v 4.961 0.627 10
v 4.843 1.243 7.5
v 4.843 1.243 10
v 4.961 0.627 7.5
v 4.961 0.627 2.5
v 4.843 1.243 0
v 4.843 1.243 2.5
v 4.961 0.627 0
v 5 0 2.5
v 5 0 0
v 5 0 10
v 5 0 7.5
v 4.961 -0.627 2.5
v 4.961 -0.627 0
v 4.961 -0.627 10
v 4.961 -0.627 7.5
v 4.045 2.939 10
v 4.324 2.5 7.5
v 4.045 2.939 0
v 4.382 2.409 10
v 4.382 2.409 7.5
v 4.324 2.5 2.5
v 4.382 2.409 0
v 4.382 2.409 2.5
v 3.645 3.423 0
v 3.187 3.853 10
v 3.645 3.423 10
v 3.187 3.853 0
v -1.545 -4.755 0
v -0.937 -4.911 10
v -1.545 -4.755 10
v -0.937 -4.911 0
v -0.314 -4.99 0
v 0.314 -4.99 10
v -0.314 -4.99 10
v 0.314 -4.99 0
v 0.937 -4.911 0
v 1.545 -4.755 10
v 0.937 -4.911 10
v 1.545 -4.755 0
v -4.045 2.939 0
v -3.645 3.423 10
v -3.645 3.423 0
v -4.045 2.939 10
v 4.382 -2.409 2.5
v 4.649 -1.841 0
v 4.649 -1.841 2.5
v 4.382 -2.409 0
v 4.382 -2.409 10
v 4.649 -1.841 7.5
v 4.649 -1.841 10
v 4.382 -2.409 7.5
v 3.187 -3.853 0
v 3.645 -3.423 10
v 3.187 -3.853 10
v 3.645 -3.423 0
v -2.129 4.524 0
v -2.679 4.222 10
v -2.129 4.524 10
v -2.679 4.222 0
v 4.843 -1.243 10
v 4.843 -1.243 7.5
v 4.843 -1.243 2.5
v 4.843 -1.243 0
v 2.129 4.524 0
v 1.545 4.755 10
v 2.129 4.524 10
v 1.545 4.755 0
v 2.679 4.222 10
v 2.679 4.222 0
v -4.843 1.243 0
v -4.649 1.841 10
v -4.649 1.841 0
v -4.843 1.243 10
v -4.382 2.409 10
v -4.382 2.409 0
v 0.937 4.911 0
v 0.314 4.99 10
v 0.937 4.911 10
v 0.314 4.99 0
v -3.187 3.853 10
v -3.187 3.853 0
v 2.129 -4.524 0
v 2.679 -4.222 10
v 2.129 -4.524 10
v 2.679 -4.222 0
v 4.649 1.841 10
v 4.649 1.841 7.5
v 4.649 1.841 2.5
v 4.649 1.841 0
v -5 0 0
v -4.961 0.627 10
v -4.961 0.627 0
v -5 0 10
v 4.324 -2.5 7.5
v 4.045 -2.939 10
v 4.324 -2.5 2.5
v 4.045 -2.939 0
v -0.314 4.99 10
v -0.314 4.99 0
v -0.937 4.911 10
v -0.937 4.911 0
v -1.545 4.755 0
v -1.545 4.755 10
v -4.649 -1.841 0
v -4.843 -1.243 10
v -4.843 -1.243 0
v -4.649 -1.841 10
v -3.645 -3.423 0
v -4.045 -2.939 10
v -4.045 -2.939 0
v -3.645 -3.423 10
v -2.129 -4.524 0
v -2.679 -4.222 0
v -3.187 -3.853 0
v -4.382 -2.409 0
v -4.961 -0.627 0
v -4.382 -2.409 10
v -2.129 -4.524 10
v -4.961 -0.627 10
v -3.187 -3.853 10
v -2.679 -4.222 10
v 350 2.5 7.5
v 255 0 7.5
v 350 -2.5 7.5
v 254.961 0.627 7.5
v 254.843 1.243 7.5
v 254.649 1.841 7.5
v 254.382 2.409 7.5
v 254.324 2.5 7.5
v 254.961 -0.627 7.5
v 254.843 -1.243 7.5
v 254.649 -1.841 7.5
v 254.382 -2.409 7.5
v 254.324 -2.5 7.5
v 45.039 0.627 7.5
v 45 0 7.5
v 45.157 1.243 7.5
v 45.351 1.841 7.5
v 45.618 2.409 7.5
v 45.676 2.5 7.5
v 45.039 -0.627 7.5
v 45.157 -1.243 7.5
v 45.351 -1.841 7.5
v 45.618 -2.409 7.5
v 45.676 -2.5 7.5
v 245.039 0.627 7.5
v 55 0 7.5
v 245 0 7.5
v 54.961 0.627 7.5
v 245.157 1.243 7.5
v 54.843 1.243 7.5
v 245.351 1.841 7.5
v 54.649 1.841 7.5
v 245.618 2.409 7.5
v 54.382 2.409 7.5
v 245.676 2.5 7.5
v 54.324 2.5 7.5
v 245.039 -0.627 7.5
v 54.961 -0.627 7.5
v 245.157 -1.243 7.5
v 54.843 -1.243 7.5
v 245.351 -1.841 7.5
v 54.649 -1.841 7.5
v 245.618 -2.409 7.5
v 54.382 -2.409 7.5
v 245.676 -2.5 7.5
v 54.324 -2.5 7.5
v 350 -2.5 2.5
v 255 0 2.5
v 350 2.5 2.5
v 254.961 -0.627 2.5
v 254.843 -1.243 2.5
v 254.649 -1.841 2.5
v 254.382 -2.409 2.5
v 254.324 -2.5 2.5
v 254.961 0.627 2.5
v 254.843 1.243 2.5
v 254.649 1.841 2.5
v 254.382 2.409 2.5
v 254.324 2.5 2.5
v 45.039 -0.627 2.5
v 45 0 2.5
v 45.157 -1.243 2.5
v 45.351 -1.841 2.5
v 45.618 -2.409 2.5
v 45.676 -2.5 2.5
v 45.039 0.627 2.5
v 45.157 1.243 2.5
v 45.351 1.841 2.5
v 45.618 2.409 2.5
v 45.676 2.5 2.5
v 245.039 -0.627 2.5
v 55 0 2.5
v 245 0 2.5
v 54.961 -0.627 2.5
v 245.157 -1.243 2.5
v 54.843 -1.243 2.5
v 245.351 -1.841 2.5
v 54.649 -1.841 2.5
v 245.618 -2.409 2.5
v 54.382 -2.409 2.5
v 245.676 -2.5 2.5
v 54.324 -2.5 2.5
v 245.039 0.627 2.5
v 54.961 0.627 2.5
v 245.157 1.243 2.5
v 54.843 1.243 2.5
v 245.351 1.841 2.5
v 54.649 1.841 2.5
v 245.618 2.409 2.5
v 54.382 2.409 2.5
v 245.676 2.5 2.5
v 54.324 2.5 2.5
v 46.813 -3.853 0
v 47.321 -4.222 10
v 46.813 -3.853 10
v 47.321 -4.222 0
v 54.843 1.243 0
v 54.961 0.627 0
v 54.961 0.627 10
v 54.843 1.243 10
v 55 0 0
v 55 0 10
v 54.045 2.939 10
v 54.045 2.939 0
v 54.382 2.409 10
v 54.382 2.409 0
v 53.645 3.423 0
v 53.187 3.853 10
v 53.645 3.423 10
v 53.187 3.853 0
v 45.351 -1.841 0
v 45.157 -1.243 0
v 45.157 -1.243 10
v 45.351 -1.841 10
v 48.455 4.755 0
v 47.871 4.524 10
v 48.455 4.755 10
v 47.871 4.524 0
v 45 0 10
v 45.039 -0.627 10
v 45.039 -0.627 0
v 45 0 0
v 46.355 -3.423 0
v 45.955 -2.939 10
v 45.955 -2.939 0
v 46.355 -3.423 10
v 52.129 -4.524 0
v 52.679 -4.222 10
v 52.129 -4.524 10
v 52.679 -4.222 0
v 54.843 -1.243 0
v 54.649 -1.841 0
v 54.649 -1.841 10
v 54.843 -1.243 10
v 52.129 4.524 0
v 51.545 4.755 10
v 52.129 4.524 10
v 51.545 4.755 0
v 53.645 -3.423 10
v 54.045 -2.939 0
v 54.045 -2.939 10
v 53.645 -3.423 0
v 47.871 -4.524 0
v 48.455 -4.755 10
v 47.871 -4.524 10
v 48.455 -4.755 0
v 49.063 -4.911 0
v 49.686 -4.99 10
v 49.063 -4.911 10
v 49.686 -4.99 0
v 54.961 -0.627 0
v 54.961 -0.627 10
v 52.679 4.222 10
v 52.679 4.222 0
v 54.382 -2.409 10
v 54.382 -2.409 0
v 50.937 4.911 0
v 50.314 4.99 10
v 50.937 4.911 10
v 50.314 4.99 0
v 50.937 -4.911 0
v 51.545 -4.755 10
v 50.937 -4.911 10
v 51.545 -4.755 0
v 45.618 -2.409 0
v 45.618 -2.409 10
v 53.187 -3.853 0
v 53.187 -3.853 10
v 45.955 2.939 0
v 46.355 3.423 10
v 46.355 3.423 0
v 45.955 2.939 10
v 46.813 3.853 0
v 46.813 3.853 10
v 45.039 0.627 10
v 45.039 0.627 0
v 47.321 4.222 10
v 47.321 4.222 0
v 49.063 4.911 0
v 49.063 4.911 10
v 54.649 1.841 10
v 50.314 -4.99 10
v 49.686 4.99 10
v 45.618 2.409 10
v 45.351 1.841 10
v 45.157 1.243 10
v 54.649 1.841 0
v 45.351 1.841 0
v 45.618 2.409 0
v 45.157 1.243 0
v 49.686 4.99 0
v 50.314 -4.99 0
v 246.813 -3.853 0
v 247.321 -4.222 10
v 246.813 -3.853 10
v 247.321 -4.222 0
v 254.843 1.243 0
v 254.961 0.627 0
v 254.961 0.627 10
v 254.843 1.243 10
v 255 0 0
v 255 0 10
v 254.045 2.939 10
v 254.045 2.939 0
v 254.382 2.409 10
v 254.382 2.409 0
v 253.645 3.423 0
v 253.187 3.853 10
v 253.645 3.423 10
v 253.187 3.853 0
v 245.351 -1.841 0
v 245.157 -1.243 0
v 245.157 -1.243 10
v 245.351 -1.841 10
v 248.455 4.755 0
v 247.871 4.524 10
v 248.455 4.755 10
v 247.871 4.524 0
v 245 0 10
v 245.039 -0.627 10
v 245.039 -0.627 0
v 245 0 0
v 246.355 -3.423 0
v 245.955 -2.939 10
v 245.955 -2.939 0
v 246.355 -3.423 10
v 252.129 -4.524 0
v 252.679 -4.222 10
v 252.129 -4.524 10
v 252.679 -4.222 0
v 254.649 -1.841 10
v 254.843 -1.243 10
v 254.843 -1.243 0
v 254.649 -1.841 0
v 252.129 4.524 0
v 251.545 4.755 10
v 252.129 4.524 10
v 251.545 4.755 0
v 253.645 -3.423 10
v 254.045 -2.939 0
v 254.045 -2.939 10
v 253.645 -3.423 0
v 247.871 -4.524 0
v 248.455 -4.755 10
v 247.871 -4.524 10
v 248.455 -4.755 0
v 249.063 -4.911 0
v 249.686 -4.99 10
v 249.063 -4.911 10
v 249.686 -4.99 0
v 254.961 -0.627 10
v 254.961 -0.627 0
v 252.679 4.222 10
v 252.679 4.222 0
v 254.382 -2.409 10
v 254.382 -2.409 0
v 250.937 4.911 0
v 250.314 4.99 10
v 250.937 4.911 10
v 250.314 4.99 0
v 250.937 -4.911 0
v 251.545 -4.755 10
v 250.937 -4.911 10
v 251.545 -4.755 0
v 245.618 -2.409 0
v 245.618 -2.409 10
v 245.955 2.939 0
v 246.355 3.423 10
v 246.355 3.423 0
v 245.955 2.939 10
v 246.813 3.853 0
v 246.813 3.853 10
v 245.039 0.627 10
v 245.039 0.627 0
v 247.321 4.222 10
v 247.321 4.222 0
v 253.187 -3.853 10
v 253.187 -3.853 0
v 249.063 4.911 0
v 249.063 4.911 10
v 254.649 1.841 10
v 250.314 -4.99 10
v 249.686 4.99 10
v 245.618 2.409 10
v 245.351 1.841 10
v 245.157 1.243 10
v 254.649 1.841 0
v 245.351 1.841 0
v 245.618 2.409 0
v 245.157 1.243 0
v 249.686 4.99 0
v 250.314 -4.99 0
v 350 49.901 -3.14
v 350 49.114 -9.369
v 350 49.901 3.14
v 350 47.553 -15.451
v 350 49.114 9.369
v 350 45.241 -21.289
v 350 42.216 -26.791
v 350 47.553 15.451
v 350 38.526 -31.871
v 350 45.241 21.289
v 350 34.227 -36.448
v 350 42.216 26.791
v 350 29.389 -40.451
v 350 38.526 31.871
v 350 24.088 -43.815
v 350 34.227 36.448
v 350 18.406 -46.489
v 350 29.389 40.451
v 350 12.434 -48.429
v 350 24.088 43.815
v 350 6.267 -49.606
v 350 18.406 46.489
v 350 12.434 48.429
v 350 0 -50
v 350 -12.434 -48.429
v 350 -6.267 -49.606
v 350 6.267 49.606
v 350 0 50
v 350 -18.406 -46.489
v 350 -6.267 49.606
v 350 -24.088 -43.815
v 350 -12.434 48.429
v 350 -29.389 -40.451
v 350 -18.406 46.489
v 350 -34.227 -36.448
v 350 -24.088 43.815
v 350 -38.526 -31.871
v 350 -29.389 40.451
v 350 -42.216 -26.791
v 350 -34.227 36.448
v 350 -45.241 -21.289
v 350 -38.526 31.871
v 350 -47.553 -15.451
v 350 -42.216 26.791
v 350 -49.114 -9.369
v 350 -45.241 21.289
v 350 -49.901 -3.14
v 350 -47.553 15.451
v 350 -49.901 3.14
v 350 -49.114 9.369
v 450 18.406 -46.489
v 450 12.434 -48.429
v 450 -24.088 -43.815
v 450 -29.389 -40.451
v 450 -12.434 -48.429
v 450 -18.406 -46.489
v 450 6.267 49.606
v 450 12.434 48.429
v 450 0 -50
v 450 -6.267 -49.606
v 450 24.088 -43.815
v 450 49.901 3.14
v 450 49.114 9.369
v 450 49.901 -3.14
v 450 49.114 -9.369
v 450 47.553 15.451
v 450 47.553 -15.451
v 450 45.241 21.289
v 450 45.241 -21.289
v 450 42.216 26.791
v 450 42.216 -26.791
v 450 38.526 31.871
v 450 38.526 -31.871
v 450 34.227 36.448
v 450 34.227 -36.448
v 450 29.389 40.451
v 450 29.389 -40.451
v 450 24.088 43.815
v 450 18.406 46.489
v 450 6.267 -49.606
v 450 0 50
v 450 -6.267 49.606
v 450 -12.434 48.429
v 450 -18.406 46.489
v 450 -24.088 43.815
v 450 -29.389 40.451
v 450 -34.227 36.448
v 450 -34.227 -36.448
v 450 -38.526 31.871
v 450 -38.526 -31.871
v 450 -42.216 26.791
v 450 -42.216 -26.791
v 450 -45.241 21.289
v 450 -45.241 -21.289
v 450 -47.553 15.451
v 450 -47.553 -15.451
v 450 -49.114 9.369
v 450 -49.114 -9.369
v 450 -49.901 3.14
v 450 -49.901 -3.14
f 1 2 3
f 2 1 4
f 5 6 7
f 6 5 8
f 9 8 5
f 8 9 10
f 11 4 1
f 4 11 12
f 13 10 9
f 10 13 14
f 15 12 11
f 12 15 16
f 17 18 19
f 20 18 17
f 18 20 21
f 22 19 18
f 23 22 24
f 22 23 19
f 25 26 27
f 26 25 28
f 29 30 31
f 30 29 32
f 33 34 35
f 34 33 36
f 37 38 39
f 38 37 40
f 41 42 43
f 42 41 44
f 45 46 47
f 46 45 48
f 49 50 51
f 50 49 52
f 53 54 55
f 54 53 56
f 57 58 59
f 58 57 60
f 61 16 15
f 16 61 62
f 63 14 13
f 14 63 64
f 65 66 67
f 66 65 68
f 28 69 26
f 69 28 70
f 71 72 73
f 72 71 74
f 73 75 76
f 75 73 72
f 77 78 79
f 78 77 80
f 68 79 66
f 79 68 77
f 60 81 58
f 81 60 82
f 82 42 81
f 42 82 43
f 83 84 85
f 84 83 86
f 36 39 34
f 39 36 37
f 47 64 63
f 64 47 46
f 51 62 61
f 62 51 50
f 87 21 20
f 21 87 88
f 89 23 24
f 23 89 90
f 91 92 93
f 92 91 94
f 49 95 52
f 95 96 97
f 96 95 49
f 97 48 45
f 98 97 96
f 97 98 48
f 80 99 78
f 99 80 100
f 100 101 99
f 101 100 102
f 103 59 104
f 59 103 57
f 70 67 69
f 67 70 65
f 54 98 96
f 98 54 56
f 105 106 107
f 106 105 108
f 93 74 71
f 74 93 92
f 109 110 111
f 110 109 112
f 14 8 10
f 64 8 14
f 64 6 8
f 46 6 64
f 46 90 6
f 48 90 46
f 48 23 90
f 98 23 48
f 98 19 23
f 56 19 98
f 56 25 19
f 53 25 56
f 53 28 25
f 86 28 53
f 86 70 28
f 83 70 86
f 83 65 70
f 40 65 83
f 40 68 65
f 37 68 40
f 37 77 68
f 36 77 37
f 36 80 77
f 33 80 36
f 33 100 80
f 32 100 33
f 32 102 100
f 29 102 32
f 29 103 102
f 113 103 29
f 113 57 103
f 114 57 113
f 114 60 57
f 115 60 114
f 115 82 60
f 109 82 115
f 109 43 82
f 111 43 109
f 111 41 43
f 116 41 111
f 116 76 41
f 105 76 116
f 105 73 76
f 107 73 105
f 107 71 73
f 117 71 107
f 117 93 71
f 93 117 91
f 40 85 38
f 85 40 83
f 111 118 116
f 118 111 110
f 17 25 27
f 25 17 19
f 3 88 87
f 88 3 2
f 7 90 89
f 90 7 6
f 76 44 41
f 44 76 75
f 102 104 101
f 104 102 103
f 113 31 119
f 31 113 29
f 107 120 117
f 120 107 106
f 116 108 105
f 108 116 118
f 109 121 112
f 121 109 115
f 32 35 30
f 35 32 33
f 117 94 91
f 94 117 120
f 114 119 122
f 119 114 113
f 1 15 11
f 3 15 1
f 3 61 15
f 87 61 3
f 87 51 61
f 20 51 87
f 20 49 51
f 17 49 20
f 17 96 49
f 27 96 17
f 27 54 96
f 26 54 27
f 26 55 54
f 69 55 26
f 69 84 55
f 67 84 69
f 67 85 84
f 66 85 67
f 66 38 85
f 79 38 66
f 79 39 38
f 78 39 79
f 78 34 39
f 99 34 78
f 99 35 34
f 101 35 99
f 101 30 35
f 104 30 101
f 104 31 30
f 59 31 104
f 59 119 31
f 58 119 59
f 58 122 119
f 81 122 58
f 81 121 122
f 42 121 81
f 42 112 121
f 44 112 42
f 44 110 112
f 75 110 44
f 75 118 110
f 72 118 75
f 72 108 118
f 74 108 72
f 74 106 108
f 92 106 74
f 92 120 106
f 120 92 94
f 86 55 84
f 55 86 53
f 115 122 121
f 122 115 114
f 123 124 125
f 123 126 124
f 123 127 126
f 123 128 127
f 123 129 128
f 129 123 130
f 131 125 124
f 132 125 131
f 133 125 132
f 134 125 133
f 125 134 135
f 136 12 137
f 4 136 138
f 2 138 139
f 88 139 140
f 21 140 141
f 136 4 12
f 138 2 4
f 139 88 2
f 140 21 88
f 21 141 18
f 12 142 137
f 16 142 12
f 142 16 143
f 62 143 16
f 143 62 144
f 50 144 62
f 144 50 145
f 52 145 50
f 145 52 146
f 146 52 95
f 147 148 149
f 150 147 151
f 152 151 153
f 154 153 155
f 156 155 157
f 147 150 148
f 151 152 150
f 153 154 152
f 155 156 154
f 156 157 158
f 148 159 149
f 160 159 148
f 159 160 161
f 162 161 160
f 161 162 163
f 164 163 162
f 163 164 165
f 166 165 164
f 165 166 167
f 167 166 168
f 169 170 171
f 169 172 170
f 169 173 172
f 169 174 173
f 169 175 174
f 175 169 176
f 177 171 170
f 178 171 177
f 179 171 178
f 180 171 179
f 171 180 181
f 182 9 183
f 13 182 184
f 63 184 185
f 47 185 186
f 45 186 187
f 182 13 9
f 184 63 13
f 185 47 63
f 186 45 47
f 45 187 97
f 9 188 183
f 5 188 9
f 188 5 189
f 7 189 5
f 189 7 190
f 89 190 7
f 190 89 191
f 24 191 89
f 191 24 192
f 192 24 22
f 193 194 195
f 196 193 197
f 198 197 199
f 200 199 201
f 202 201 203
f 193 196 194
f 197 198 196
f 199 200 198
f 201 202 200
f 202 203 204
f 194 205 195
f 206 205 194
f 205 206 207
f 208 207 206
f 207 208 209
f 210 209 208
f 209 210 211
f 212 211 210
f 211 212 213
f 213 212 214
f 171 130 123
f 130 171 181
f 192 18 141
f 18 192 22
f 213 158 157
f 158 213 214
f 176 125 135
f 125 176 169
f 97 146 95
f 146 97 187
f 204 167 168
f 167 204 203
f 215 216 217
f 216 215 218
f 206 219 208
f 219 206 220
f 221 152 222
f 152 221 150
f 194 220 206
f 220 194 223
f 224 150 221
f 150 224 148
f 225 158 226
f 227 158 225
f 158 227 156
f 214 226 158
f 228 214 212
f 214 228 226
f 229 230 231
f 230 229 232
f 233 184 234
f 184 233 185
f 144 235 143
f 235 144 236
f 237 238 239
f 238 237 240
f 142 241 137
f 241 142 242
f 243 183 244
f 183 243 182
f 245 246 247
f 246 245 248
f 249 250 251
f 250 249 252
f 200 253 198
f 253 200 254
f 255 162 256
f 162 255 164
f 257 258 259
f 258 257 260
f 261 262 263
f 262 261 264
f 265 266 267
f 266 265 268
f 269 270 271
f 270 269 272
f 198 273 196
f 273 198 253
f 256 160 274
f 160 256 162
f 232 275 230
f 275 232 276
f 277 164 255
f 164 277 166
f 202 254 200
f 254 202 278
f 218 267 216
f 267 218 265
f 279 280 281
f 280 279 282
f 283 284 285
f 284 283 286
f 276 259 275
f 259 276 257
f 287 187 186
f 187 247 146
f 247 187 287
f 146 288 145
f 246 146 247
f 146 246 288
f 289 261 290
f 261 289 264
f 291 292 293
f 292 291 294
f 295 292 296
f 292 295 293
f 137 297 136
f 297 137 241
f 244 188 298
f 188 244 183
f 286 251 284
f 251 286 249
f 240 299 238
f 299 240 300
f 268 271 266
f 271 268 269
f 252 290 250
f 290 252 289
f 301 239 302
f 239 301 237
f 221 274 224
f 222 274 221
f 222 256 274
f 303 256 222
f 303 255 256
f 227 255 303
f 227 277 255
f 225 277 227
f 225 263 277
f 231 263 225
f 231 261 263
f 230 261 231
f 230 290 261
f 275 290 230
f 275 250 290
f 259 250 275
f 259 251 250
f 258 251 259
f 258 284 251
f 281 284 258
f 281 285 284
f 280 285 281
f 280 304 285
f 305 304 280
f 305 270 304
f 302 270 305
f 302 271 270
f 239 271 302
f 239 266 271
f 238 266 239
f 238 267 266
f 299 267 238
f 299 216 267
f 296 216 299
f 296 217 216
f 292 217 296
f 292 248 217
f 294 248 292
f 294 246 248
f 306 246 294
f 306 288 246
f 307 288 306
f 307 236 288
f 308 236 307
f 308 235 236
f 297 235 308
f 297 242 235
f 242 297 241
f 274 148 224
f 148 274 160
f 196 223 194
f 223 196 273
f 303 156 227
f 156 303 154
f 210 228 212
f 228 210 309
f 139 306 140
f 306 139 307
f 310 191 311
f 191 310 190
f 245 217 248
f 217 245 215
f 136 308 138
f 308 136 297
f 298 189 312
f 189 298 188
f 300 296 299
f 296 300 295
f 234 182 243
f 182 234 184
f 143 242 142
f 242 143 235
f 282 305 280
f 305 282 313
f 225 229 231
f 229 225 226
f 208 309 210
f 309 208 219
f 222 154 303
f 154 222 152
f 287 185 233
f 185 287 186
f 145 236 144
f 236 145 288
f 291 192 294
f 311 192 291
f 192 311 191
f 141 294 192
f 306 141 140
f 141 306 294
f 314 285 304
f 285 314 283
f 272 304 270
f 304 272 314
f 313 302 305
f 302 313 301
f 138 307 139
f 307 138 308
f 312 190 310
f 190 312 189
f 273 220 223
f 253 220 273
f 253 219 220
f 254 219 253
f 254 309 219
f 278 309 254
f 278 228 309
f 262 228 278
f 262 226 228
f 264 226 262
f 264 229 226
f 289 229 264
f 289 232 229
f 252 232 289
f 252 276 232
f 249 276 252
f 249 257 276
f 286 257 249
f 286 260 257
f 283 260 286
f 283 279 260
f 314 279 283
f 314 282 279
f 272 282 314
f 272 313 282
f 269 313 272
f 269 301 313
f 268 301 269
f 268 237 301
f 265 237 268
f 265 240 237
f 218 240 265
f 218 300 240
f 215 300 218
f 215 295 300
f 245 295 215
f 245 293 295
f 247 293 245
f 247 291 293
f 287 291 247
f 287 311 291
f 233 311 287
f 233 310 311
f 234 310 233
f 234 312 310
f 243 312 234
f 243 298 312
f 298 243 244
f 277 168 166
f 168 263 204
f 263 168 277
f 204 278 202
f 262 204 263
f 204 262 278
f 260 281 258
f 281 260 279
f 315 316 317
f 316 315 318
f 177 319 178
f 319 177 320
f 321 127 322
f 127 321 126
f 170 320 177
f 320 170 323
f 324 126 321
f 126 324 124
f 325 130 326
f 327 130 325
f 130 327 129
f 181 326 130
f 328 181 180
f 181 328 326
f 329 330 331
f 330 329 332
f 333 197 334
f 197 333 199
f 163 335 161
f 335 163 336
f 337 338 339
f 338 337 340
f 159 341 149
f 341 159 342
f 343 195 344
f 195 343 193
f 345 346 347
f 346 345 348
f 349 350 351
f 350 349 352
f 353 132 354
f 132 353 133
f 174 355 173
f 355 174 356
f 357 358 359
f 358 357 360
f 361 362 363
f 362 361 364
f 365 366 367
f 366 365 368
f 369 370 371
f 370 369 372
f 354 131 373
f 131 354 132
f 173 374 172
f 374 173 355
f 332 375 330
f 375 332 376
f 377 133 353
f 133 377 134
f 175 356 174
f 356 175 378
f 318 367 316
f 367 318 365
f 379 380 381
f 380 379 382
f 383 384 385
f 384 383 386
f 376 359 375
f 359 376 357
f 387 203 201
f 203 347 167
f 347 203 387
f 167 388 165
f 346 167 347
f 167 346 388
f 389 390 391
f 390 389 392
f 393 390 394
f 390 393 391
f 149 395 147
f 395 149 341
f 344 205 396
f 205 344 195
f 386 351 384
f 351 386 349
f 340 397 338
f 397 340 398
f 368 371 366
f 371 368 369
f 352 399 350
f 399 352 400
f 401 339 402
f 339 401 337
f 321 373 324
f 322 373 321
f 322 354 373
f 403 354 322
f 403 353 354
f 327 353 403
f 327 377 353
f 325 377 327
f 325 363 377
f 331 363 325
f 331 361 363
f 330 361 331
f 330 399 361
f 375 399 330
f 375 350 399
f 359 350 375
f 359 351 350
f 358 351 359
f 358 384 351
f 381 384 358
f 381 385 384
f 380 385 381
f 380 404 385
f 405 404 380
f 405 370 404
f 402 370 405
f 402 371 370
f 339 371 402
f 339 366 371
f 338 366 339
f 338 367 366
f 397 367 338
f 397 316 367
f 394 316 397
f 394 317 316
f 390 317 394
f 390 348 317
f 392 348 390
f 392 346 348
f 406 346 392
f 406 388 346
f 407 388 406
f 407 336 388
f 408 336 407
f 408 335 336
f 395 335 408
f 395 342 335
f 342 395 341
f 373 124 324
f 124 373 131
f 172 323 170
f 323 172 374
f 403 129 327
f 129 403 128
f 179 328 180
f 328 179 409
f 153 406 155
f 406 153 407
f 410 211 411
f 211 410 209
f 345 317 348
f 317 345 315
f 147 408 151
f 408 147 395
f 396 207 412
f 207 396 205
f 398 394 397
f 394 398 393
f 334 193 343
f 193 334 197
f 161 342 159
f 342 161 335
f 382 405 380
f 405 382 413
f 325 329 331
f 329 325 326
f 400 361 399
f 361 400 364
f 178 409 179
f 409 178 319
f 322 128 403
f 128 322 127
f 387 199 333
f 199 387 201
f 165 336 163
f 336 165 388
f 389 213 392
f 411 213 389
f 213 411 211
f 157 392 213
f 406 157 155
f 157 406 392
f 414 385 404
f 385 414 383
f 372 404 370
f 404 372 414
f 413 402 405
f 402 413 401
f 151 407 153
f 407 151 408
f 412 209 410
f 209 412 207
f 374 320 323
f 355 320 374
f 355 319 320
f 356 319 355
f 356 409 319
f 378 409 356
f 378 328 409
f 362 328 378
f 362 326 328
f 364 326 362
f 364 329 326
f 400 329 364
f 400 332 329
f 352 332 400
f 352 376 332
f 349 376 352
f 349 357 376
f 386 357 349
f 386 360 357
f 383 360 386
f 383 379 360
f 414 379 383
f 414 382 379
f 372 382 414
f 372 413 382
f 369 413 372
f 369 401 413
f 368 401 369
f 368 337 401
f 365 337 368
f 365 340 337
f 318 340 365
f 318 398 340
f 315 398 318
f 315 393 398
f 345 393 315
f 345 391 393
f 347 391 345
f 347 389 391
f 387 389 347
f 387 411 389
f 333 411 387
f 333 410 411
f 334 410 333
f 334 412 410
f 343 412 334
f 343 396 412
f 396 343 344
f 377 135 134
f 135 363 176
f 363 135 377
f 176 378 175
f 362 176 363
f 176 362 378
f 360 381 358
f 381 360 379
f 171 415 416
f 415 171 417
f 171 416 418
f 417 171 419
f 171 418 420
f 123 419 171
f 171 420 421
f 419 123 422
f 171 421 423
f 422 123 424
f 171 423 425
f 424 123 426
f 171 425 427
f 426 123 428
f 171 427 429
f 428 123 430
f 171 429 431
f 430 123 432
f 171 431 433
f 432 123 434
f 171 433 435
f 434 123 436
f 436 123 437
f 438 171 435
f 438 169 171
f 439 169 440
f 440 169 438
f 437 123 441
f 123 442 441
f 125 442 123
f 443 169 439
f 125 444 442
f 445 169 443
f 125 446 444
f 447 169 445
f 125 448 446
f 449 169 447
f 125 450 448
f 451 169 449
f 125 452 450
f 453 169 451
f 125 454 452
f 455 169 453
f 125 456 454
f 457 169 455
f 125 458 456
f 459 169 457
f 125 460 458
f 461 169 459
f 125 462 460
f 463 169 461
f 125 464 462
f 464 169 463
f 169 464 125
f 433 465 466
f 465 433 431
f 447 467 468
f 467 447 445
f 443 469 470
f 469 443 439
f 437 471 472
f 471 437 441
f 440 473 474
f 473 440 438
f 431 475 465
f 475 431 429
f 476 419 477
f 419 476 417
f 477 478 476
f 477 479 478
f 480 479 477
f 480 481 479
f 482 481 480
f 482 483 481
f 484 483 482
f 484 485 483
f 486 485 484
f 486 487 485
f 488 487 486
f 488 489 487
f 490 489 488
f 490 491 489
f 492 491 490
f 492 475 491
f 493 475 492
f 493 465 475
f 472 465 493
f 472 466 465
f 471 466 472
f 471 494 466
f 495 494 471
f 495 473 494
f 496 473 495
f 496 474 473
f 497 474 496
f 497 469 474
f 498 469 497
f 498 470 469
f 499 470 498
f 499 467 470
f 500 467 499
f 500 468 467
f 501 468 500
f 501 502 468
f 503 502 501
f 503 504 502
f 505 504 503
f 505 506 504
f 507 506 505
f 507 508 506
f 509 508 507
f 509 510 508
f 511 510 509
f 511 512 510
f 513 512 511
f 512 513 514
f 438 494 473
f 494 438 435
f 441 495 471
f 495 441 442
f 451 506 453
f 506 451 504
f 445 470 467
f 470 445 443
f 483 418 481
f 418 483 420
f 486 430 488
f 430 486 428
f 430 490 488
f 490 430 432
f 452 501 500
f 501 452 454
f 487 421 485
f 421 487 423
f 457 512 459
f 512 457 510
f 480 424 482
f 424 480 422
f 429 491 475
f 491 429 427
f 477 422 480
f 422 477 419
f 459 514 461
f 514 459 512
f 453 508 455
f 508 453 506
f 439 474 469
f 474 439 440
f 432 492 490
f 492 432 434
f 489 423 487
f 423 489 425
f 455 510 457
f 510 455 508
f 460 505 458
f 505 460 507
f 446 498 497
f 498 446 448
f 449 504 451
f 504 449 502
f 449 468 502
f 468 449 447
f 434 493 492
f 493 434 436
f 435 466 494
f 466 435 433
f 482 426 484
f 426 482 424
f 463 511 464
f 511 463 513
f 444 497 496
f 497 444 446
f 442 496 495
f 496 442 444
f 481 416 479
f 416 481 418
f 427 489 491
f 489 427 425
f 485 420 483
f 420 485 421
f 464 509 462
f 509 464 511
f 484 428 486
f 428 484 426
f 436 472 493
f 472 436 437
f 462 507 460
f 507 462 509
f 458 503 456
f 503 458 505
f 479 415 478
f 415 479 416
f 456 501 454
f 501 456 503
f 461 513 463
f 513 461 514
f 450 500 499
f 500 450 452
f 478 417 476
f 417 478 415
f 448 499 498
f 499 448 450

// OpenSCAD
// Кривошипно‑повзунний механізм (спрощений)
// Параметри: довжина кривошипа, довжина шатуна, положення кута

module crank_slider(crank_radius=40, rod_length=120, rod2_length=120, angle=0) {
    w=10;




    // Привод
    color("red")
    cylinder(h=w, r=w/2, $fn=50);


    // Кривошип (плечо)
    color("blue")
    rotate([0,0,angle])
        translate([0,-w/4,w/4])
            cube([crank_radius,w/2,w/2]);

    
    // Кривошип (диск)
    color("green")
    rotate([0,0,angle])
        translate([crank_radius,0,0])
            cylinder(h=10, r=w/2, $fn=50);

    
    
    // Шатун (з'єднання кривошипа з повзуном)
    // Кінцева точка кривошипа
    x_crank = crank_radius*cos(angle);
    y_crank = crank_radius*sin(angle);

    // Положення повзуна (по осі X)
    //x_slider = x_crank + sqrt(rod_length*rod_length - y_crank*y_crank);

    // Положення повзуна (по осі X, Y=0)
    x_slider = sqrt(rod_length*rod_length - y_crank*y_crank) + x_crank;


     // Кут шатуна відносно осі X
    rod_angle = atan2(y_crank, x_slider - x_crank);
    
    
    // Шатун як стрижень
    
    color("aqua")
    translate([x_crank,y_crank,0])
       translate([0,-w/4,w/4]) // center rod
          rotate([0,0,-rod_angle])
             cube([rod_length,w/2,w/2]);
             
             

    // Повзун (блок)
    color("purple")
    translate([x_slider,0,0])
        cylinder(h=10, r=w/2, $fn=50);


    translate([x_slider,0,0])
       translate([0,-w/4,w/4]) // center rod
             cube([rod2_length,w/2,w/2]);



    color("yellow")
        translate([x_slider+rod2_length,0,0])
          rotate([0,90,0])
            cylinder(h=100, r=50, $fn=50);             

}


// Виклик модуля
// angle можна анімувати через параметр $t
crank_slider(crank_radius=50, rod_length=200, rod2_length=100,  angle=$t*360);
